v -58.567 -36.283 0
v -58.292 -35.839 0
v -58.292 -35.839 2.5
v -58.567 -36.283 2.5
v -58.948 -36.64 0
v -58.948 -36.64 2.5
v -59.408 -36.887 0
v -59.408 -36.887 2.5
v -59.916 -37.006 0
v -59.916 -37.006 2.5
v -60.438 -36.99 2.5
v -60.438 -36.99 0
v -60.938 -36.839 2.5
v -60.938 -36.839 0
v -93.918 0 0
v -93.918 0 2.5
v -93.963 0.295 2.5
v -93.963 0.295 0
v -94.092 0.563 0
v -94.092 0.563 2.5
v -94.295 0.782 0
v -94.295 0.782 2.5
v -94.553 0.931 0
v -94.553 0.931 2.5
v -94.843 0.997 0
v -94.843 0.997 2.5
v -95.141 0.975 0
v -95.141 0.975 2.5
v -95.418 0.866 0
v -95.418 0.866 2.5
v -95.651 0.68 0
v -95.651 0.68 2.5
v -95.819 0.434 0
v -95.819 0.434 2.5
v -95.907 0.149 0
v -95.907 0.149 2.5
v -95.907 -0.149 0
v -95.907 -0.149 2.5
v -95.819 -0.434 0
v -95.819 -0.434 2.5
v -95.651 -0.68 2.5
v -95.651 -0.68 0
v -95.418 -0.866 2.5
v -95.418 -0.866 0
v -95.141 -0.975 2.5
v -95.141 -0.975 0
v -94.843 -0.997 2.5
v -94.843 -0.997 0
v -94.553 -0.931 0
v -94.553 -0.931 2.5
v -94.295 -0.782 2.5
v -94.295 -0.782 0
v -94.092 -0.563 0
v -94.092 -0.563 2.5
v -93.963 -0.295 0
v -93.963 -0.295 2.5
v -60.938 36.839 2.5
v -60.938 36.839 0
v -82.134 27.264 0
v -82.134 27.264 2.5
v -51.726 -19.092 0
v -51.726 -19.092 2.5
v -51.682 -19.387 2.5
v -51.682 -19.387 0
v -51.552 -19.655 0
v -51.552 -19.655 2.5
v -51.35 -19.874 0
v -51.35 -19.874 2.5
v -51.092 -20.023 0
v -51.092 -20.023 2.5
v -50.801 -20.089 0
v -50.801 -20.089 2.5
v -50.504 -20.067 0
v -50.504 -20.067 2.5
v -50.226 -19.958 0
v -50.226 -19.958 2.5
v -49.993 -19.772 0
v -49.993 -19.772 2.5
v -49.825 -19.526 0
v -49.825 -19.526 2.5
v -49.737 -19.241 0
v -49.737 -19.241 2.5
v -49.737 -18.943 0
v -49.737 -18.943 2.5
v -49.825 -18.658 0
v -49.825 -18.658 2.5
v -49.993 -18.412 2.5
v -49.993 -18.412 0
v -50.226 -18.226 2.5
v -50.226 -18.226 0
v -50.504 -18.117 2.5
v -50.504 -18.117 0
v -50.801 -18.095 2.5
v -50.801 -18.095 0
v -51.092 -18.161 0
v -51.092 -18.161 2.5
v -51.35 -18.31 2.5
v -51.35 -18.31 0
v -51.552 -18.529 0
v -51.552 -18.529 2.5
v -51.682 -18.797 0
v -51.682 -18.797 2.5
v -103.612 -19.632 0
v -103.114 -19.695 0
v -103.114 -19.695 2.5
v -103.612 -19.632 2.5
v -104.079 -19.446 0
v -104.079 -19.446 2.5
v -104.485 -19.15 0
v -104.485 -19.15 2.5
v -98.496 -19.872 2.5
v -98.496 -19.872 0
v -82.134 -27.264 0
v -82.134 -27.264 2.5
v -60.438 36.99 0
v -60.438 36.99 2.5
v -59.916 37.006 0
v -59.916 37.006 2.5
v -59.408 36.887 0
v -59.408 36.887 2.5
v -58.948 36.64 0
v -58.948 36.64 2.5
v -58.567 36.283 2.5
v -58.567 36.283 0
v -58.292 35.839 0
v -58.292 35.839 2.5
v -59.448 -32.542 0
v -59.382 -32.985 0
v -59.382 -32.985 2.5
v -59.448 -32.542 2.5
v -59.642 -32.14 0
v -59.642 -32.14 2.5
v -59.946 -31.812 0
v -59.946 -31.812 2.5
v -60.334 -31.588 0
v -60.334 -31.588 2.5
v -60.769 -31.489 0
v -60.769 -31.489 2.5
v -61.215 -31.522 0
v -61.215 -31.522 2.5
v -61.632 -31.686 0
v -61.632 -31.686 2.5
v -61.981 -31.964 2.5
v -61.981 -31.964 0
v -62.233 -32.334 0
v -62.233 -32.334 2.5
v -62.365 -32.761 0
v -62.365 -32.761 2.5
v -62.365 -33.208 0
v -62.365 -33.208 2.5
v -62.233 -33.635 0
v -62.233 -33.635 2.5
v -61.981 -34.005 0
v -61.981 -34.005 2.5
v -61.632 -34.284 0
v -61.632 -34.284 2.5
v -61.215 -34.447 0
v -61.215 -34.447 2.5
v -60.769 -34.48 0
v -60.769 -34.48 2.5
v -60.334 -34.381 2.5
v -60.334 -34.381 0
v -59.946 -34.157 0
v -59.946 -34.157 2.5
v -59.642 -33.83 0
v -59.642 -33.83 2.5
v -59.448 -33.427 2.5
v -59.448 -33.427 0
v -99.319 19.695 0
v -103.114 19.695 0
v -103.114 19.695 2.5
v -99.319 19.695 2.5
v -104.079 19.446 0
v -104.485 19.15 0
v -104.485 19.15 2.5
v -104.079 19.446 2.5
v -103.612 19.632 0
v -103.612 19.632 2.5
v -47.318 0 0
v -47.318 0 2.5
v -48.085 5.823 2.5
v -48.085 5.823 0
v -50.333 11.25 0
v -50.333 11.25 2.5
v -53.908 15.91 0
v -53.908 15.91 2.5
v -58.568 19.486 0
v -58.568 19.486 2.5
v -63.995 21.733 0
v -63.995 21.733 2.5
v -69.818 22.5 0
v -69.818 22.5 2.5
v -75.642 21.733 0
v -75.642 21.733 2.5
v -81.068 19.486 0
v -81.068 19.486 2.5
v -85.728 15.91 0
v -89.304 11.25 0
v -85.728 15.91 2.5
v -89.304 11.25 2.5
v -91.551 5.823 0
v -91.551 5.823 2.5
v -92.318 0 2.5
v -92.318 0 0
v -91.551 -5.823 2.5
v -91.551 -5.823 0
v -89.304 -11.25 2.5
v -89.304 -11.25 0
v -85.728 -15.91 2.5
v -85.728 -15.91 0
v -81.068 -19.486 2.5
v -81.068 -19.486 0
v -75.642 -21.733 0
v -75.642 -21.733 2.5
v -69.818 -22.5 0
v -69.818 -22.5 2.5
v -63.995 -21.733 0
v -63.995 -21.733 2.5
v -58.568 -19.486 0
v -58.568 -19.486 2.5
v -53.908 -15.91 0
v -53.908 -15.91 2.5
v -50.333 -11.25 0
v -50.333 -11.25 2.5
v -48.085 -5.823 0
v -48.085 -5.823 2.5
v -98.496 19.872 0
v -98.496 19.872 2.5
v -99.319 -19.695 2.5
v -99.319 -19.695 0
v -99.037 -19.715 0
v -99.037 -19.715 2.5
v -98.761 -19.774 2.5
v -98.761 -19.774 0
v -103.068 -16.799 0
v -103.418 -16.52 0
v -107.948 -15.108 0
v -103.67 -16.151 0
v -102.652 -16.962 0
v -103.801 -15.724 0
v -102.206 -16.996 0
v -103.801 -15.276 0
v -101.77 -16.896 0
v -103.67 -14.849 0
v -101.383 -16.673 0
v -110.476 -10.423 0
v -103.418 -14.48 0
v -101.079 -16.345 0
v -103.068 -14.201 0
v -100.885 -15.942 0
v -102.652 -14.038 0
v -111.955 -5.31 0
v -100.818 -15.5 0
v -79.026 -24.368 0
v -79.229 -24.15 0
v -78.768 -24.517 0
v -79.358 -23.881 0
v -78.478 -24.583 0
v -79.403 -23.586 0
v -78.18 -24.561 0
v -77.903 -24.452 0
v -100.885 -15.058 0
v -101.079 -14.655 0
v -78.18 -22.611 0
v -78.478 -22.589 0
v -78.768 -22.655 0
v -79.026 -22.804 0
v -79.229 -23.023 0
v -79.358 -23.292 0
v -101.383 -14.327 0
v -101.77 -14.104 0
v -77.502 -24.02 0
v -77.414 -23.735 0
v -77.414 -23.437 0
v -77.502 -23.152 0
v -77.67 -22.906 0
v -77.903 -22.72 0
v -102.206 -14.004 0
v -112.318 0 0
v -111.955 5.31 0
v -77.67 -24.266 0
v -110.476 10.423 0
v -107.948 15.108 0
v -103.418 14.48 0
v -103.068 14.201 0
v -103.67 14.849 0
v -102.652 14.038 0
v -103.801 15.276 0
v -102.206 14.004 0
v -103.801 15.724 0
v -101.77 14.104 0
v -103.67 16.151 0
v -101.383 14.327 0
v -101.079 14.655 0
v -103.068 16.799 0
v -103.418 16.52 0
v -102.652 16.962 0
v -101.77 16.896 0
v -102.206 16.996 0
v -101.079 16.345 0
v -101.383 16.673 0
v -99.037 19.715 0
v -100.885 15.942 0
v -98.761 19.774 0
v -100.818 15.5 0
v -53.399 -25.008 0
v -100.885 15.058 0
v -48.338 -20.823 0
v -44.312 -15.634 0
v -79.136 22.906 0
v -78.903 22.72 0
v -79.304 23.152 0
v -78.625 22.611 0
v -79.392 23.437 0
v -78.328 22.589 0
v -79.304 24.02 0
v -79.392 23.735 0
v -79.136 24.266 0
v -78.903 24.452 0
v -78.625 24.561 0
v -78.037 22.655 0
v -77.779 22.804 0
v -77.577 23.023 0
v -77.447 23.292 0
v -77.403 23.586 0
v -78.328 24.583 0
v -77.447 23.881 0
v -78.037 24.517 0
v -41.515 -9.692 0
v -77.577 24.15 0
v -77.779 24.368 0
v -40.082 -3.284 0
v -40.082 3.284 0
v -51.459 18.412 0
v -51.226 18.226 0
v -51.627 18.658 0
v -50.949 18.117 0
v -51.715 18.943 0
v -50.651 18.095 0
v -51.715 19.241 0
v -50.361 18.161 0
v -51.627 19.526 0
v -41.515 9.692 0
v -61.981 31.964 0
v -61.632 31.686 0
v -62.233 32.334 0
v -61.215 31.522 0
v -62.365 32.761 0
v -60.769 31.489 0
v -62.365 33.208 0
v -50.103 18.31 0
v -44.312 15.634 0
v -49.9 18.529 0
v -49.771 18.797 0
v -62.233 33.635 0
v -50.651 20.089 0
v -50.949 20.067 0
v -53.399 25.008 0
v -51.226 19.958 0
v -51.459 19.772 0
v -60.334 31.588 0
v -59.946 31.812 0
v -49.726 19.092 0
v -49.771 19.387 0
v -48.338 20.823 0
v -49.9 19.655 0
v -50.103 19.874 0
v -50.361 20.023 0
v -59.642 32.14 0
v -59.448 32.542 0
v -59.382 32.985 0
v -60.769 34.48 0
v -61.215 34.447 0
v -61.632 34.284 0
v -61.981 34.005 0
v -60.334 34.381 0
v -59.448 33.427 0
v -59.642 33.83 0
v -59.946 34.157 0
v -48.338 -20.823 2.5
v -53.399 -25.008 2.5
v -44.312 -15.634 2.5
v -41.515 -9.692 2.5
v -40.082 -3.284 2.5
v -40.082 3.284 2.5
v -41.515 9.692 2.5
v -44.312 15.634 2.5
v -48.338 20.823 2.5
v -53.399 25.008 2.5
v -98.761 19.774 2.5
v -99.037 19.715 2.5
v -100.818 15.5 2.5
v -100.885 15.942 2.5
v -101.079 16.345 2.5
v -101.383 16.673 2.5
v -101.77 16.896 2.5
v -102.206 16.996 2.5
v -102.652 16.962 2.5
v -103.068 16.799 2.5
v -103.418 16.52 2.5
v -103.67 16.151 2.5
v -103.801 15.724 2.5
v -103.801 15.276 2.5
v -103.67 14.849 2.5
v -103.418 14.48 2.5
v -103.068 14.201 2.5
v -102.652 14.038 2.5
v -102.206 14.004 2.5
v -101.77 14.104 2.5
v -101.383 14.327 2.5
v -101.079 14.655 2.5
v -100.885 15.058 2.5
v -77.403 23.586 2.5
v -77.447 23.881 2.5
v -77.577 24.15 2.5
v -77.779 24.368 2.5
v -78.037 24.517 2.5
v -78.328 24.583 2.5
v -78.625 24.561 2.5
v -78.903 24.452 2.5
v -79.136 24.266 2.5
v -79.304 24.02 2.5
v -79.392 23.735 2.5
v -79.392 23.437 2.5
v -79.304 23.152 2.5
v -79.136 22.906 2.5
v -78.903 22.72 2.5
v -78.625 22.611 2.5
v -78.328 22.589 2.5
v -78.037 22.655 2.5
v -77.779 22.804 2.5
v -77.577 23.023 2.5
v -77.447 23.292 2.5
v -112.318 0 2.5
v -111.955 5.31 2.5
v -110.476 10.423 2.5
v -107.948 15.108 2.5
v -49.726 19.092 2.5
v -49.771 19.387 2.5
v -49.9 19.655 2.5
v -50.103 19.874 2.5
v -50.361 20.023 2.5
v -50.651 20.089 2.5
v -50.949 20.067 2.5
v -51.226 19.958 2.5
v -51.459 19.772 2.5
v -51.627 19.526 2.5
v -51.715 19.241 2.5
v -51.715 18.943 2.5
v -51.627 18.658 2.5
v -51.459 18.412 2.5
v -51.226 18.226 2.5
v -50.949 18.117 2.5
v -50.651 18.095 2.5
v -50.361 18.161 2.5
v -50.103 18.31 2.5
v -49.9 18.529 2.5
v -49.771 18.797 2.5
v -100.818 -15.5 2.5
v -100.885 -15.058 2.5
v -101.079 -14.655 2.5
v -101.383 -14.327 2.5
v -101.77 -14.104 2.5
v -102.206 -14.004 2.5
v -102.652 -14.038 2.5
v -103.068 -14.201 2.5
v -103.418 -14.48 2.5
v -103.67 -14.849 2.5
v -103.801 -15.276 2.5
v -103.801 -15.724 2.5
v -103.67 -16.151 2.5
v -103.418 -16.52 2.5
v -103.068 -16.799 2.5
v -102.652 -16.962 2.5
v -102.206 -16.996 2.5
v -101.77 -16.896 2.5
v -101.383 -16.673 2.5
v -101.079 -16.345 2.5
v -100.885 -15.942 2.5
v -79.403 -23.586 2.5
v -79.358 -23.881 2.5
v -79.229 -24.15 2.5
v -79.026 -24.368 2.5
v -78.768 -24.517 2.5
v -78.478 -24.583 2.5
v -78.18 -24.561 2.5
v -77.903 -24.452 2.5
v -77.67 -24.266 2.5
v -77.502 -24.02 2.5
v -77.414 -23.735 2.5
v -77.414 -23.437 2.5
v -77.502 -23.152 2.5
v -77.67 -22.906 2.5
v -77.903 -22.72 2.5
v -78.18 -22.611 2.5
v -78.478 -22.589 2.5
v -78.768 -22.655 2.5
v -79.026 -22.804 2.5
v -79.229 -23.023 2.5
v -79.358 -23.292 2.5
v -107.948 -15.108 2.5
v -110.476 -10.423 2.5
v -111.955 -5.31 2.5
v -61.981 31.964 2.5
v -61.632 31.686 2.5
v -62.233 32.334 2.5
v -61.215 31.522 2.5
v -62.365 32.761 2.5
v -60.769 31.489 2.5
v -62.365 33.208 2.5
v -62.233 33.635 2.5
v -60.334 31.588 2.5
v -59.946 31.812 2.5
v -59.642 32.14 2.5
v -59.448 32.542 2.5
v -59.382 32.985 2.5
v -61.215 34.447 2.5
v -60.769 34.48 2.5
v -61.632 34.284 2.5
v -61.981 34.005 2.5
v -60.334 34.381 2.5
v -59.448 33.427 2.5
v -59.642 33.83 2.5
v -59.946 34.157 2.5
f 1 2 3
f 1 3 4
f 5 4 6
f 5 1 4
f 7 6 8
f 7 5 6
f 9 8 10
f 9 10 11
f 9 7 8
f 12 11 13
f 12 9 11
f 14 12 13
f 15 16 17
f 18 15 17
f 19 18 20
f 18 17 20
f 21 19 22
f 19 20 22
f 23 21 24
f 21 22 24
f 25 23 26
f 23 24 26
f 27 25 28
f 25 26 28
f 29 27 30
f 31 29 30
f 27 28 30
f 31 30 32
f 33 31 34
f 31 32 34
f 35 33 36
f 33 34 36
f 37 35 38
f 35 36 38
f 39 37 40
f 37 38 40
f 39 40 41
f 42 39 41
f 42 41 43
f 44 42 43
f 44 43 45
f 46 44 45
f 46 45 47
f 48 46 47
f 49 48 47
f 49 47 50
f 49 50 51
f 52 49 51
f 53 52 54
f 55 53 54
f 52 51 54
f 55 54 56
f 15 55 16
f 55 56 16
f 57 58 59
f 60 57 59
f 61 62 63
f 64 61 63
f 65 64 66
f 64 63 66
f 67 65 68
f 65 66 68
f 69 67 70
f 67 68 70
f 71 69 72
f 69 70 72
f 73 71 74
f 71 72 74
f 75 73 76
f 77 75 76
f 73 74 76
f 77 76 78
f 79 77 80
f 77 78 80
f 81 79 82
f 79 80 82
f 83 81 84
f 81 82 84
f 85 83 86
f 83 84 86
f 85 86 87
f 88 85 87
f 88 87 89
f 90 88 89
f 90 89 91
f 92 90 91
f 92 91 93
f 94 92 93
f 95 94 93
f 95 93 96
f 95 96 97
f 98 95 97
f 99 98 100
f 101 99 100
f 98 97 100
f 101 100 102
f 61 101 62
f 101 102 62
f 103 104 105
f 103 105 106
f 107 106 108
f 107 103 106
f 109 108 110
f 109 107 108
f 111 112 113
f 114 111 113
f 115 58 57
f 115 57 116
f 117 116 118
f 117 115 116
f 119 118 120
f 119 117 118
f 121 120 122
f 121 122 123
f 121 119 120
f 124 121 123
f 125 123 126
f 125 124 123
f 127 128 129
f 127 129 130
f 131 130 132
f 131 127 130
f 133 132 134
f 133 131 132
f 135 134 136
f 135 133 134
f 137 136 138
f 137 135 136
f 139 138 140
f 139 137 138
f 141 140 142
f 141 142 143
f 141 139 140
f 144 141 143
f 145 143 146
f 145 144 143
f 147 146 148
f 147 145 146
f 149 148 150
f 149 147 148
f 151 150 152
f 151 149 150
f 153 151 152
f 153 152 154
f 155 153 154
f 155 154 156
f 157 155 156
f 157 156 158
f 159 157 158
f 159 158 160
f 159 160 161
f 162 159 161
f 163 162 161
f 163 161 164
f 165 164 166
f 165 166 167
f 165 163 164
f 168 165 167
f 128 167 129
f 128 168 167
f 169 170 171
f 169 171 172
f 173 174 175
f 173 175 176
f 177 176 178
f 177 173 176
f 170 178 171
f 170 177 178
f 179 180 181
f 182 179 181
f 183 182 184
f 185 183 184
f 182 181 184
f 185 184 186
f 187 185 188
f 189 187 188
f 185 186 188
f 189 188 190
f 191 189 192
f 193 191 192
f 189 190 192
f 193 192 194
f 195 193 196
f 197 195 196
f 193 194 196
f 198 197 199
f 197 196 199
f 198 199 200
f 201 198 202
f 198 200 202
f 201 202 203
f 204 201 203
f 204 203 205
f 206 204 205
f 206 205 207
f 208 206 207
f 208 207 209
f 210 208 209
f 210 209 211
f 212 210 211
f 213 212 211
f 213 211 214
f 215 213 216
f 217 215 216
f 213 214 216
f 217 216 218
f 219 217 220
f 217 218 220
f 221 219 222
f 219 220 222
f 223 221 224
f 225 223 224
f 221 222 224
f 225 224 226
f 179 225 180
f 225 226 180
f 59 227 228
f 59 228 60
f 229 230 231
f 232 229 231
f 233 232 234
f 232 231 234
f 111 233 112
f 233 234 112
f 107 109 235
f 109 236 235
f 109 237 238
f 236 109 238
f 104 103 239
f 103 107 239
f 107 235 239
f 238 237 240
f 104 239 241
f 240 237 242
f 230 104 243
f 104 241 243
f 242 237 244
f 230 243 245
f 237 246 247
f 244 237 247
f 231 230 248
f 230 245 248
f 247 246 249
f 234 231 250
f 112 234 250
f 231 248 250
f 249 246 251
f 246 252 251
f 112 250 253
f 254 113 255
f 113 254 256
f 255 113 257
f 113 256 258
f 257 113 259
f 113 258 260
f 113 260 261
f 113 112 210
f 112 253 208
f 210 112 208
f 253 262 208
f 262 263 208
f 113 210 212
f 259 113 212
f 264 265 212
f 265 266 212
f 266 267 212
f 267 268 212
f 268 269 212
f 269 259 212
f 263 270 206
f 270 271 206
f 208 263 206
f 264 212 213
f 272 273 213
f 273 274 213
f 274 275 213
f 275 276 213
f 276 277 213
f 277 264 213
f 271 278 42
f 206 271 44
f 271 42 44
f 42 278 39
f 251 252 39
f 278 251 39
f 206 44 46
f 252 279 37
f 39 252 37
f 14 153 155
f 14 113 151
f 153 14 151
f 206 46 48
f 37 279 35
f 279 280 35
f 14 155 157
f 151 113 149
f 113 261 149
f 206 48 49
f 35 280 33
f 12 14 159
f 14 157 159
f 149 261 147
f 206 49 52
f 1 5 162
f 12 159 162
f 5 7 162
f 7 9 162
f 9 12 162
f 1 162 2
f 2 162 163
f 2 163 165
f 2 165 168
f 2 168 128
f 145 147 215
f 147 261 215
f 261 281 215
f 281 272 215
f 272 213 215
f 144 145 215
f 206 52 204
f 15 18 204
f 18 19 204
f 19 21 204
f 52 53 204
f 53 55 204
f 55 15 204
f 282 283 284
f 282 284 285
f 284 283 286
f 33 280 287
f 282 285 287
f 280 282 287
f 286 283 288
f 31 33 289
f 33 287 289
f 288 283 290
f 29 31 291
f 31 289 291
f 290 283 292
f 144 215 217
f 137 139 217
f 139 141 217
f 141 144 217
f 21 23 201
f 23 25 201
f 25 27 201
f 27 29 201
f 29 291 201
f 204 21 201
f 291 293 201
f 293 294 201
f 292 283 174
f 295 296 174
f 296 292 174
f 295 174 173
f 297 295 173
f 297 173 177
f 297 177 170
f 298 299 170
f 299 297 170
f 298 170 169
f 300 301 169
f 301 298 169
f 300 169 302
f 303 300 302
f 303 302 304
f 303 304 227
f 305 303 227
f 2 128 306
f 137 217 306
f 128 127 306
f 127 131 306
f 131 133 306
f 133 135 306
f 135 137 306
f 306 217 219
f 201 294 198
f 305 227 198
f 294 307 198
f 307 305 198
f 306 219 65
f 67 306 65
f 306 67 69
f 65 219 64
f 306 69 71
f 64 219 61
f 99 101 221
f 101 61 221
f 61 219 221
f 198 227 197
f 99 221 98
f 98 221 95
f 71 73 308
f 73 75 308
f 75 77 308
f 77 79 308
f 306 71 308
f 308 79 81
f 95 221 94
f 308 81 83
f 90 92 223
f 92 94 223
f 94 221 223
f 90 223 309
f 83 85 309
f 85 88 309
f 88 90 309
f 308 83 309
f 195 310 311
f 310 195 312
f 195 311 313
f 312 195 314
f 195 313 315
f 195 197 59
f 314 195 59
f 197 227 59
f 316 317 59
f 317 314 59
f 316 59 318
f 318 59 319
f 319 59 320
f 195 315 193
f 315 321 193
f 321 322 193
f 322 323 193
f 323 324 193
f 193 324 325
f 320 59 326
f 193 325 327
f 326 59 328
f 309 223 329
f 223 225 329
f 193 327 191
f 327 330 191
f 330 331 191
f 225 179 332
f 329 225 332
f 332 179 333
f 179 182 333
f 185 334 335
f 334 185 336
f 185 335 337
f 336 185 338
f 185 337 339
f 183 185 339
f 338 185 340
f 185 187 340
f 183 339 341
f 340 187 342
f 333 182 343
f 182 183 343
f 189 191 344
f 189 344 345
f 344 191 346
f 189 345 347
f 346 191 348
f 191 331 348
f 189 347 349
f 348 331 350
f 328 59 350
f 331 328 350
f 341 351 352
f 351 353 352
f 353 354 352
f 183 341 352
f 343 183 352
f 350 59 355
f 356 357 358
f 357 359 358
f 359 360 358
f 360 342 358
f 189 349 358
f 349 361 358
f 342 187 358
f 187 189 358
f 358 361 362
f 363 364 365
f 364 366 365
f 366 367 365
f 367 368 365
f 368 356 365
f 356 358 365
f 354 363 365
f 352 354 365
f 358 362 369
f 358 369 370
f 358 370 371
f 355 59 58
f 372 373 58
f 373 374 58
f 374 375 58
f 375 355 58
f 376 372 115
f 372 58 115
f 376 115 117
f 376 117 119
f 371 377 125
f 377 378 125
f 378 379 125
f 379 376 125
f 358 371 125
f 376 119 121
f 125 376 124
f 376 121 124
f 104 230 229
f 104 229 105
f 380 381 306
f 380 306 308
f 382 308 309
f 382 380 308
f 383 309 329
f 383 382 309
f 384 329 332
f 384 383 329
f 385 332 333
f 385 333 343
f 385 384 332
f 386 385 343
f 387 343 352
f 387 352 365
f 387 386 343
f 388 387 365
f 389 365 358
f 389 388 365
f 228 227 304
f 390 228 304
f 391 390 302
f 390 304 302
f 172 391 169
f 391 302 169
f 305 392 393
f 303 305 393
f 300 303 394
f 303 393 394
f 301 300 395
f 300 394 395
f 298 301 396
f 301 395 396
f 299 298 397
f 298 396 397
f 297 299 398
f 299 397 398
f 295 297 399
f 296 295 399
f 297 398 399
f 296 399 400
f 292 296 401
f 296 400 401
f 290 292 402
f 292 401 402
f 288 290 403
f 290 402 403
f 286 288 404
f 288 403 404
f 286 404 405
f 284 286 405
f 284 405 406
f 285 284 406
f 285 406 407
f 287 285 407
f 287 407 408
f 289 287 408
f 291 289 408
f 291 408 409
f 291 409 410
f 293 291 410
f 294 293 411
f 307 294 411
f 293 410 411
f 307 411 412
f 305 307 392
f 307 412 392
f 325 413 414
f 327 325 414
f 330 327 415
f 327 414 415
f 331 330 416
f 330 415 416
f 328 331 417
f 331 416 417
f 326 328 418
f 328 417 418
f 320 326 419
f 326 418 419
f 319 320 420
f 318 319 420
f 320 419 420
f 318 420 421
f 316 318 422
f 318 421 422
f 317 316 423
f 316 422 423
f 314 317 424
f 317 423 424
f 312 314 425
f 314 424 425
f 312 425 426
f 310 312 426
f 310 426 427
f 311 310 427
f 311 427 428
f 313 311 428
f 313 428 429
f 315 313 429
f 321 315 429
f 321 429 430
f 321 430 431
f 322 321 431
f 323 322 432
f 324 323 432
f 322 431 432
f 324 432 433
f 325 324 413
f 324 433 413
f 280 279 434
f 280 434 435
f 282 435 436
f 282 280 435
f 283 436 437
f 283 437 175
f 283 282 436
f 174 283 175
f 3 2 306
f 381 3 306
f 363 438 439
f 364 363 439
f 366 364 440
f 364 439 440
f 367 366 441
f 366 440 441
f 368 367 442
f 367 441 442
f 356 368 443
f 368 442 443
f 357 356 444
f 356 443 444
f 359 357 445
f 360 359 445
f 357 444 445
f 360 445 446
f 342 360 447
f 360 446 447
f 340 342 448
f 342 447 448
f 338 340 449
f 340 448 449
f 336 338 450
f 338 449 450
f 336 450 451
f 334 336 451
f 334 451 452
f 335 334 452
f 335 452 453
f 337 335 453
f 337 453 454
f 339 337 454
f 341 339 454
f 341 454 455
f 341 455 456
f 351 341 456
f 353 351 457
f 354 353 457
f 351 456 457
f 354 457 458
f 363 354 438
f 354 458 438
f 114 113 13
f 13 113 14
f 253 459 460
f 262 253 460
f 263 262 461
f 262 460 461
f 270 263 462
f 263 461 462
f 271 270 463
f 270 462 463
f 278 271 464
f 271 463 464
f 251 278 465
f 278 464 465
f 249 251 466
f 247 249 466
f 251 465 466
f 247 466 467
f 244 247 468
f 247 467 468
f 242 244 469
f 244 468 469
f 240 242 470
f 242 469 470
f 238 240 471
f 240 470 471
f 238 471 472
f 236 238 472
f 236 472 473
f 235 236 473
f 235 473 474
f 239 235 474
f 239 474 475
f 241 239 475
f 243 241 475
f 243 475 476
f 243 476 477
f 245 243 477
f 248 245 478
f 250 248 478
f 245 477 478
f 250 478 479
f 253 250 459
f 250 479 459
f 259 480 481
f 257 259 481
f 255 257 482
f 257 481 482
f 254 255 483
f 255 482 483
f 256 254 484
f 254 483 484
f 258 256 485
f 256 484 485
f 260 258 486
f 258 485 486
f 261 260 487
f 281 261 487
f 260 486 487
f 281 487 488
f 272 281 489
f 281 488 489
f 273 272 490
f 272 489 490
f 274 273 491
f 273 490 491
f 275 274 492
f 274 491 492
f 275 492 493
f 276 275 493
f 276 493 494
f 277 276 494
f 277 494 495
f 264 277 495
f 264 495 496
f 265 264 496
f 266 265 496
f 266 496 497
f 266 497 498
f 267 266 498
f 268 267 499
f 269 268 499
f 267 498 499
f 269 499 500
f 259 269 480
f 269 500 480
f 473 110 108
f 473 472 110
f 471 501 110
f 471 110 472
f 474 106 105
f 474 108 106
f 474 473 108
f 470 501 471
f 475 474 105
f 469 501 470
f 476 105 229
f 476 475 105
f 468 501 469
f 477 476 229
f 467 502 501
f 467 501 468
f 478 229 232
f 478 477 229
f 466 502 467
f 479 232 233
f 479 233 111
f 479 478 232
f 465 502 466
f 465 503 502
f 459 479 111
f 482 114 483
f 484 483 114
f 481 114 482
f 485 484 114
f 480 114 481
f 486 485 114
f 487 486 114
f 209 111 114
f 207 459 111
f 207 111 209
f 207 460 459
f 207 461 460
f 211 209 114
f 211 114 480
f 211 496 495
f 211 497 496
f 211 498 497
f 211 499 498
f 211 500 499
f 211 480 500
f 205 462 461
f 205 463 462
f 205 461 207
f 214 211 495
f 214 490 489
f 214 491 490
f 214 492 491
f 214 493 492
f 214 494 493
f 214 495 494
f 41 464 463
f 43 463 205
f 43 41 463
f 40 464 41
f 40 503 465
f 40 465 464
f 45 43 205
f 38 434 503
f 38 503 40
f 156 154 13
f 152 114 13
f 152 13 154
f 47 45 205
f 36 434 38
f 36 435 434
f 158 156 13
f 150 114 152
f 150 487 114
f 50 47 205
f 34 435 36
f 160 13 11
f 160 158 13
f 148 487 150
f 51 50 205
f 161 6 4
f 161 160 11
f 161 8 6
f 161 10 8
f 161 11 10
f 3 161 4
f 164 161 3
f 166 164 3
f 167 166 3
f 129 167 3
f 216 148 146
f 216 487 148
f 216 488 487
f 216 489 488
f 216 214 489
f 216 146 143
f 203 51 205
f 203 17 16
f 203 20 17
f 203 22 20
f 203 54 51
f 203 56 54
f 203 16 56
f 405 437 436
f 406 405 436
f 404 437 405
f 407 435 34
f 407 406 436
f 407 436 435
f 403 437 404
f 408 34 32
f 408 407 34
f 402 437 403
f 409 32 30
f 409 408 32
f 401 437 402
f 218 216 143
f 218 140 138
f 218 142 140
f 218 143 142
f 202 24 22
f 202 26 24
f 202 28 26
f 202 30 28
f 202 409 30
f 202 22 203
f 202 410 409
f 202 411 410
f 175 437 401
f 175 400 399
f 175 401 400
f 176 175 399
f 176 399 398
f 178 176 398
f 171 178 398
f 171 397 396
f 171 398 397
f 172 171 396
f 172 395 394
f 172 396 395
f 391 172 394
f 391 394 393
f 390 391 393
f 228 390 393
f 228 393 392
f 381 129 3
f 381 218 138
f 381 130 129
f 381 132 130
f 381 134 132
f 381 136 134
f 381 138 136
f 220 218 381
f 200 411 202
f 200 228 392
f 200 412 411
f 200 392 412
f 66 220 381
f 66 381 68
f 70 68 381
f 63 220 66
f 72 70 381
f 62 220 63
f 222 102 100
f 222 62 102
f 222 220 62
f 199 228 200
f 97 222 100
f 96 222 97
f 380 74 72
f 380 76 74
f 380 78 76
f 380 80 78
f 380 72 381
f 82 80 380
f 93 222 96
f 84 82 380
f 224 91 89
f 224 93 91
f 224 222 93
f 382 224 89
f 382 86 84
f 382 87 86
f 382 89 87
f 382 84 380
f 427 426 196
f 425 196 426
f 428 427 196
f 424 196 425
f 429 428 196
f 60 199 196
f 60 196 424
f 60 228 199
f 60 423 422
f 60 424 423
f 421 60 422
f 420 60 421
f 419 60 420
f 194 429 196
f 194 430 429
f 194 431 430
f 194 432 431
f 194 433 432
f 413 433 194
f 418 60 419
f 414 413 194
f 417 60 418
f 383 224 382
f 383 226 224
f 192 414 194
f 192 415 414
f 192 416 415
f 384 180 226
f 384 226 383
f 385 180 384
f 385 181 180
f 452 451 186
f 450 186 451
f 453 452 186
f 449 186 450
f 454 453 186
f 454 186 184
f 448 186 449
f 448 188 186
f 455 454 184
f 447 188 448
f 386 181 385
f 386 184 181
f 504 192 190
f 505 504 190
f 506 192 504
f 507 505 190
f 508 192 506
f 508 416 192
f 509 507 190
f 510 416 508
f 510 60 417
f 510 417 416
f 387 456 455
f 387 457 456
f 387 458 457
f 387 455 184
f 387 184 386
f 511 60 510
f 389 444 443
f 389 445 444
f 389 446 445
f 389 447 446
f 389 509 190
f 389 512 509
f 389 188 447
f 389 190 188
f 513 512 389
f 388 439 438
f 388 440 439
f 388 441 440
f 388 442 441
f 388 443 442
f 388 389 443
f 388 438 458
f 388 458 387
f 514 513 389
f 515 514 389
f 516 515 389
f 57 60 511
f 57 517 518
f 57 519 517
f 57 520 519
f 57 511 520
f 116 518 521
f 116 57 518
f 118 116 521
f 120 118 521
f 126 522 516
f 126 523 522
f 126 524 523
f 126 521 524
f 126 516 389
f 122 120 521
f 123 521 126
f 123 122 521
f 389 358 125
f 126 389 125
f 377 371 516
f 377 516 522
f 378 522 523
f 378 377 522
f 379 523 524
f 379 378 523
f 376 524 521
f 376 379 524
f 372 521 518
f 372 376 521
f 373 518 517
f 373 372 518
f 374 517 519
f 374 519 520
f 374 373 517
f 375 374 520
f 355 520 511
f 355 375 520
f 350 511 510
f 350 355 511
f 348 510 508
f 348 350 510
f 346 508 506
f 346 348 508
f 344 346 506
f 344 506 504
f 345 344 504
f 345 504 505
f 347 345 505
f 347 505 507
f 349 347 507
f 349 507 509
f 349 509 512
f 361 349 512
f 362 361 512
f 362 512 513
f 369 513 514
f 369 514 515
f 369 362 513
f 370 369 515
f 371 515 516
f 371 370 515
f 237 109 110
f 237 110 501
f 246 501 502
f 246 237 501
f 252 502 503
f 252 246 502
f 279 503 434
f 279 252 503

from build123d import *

# Parameters (mm, degrees)
CROQUIS1_R              = 2.25
CROQUIS1_R_2            = 3
CROQUIS1_R_3            = 1.5
CROQUIS1_R_4            = 2.249997567
SALIENTE_EXTRUIR1_DEPTH = 2.5
SALIENTE_EXTRUIR3_START = -2.5
CROQUIS6_R              = 2.250000066
CROQUIS6_R_2            = 1.5
CROQUIS6_R_3            = 2.25
SALIENTE_EXTRUIR3_DEPTH = 2.5
CROQUIS5_R              = 22.5
CROQUIS5_R_2            = 1
CORTAR_EXTRUIR5_DEPTH   = 2.5
CORTAR_EXTRUIR6_DEPTH   = 2.5
SALIENTE_EXTRUIR4_START = -2.5
CROQUIS11_R             = 1.5
CROQUIS11_R_2           = 1.500000006
SALIENTE_EXTRUIR4_DEPTH = 2.5
REDONDEO1_START         = -1
REDONDEO1_DEPTH         = 4
REDONDEO1_2_DEPTH       = 2.5
CROQUIS12_R             = 1.5
CORTAR_EXTRUIR7_DEPTH   = 2.5


with BuildPart() as part:
    # Croquis1 → Saliente-Extruir1 (new body)
    with BuildSketch(Plane.XY):
        with BuildLine():
            Line((-29.502526327, -44.949972179), (-23.17778065, -37.243838032))
            ThreePointArc((-23.17778065, -37.243838032), (-18.839723212, -32.444384768), (-14.046056443, -28.099933953))
            ThreePointArc((-14.046056443, -28.099933953), (-12.991422185, -27.658257217), (-11.867164621, -27.866527921))
            ThreePointArc((-11.867164621, -27.866527921), (-11.203313373, -28.112469078), (-10.500314, -28.196))
            Line((-10.500314, -28.196), (10.499686, -28.196))
            ThreePointArc((10.499686, -28.196), (11.203007921, -28.112542722), (11.867164264, -27.866528101))
            ThreePointArc((11.867164264, -27.866528101), (12.991422421, -27.658256674), (14.046057406, -28.099933523))
            ThreePointArc((14.046057406, -28.099933523), (18.839775902, -32.444337151), (23.177889012, -37.243749049))
            Line((23.177889012, -37.243749049), (29.502526012, -44.949972049))
            ThreePointArc((29.502526012, -44.949972049), (40.113877497, -46.255199126), (41.931739547, -35.719556022))
            Line((41.931739547, -35.719556022), (21.72923101, -5.566101046))
            ThreePointArc((21.72923101, -5.566101046), (20.036969431, -9.5e-08), (21.729230693, 5.566100954))
            Line((21.729230693, 5.566100954), (41.931739693, 35.719555954))
            ThreePointArc((41.931739693, 35.719555954), (40.113877277, 46.255198335), (29.502526336, 44.949972165))
            Line((29.502526336, 44.949972165), (23.17778065, 37.243838007))
            ThreePointArc((23.17778065, 37.243838007), (18.839723212, 32.444384742), (14.046056443, 28.099933927))
            ThreePointArc((14.046056443, 28.099933927), (12.991421988, 27.658257139), (11.867164252, 27.866528027))
            ThreePointArc((11.867164252, 27.866528027), (11.203313175, 28.112469073), (10.500314, 28.195999974))
            Line((10.500314, 28.195999974), (-10.500314, 28.195999974))
            ThreePointArc((-10.500314, 28.195999974), (-11.203313178, 28.112469098), (-11.867164264, 27.866528075))
            ThreePointArc((-11.867164264, 27.866528075), (-12.991422421, 27.658256648), (-14.046057406, 28.099933497))
            ThreePointArc((-14.046057406, 28.099933497), (-18.839775902, 32.444337126), (-23.177889012, 37.243749023))
            Line((-23.177889012, 37.243749023), (-29.502526012, 44.949972023))
            ThreePointArc((-29.502526012, 44.949972023), (-40.146302424, 46.230987494), (-41.886340556, 35.652554517))
            ThreePointArc((-41.886340556, 35.652554517), (-41.288874902, 25.337679941), (-50.13550001, 20.000000021))
            Line((-50.13550001, 20.000000021), (-97.31807601, 20.000000021))
            ThreePointArc((-97.31807601, 20.000000021), (-99.1994919, 19.554558541), (-100.681450855, 18.312809163))
            add(Edge.make_bspline(
                [(-107.31807554, 2.1e-08), (-107.252414123, 7.059743944), (-104.975710329, 13.164639039), (-100.681450855, 18.312809163)],
                knots=[0, 0, 0, 0, 1, 1, 1, 1], degree=3))
            add(Edge.make_bspline(
                [(-107.31807554, 2.1e-08), (-107.252414123, -7.059743902), (-104.975710329, -13.164638997), (-100.681450855, -18.312809121)],
                knots=[0, 0, 0, 0, 1, 1, 1, 1], degree=3))
            ThreePointArc((-100.681450855, -18.312809121), (-99.19949186, -19.554558345), (-97.31807601, -19.9999997))
            Line((-97.31807601, -19.9999997), (-50.13550001, -19.9999997))
            ThreePointArc((-50.13550001, -19.9999997), (-41.288874902, -25.33767962), (-41.886340556, -35.652554196))
            ThreePointArc((-41.886340556, -35.652554196), (-40.146302646, -46.230987042), (-29.502526327, -44.949972179))
        make_face()
        with Locations((-25.371621, 27.641642)):
            Circle(CROQUIS1_R, mode=Mode.SUBTRACT)
        with Locations((-35.493242035, 40.033284004)):
            Circle(CROQUIS1_R, mode=Mode.SUBTRACT)
        with Locations((-35.49324201, -40.0332837)):
            Circle(CROQUIS1_R, mode=Mode.SUBTRACT)
        with Locations((15.25, -15.25)):
            Circle(CROQUIS1_R_2, mode=Mode.SUBTRACT)
        with Locations((35.493242035, -40.03328403)):
            Circle(CROQUIS1_R, mode=Mode.SUBTRACT)
        with Locations((-15.25, 15.25)):
            Circle(CROQUIS1_R_2, mode=Mode.SUBTRACT)
        with Locations((-25.371621, -27.641642)):
            Circle(CROQUIS1_R, mode=Mode.SUBTRACT)
        with Locations((-35.318076, 15.5)):
            Circle(CROQUIS1_R_3, mode=Mode.SUBTRACT)
        with Locations((25.371621, -27.641642)):
            Circle(CROQUIS1_R, mode=Mode.SUBTRACT)
        with Locations((-15.25, -15.25)):
            Circle(CROQUIS1_R_2, mode=Mode.SUBTRACT)
        with Locations((-97.318076, 15.5)):
            Circle(CROQUIS1_R_3, mode=Mode.SUBTRACT)
        with Locations((15.25, 15.25)):
            Circle(CROQUIS1_R_2, mode=Mode.SUBTRACT)
        with Locations((-35.318076, -15.5)):
            Circle(CROQUIS1_R_3, mode=Mode.SUBTRACT)
        with Locations((25.371621, 27.641642)):
            Circle(CROQUIS1_R, mode=Mode.SUBTRACT)
        with Locations((-97.318076, -15.5)):
            Circle(CROQUIS1_R_3, mode=Mode.SUBTRACT)
        with Locations((35.493241695, 40.03328329)):
            Circle(CROQUIS1_R_4, mode=Mode.SUBTRACT)
        with BuildLine():
            Line((10.499686, -24.196), (-10.500314, -24.196))
            ThreePointArc((-10.500314, -24.196), (-11.500314, -25.196), (-10.500314, -26.196))
            Line((-10.500314, -26.196), (10.499686, -26.196))
            ThreePointArc((10.499686, -26.196), (11.499686, -25.196), (10.499686, -24.196))
        make_face(mode=Mode.SUBTRACT)
        with BuildLine():
            Line((10.499686, 24.196), (-10.500314, 24.196))
            ThreePointArc((-10.500314, 24.196), (-11.500314, 25.196), (-10.500314, 26.196))
            Line((-10.500314, 26.196), (10.499686, 26.196))
            ThreePointArc((10.499686, 26.196), (11.499686, 25.196), (10.499686, 24.196))
        make_face(mode=Mode.SUBTRACT)
    extrude(amount=SALIENTE_EXTRUIR1_DEPTH)


with BuildPart() as saliente_extruir3_tool:
    # Croquis6 → Saliente-Extruir3 (new body)
    # profile 1 of 10: a face of its own
    with BuildSketch(Plane.XY.offset(2.5).offset(SALIENTE_EXTRUIR3_START)):
        with Locations((-35.493242163, 40.033284025)):
            Circle(CROQUIS6_R)
        with Locations((-35.493242163, 40.033284025)):
            Circle(CROQUIS6_R_2, mode=Mode.SUBTRACT)
    # profile 2 of 10: a face of its own
    with BuildSketch(Plane.XY.offset(2.5).offset(SALIENTE_EXTRUIR3_START)):
        with Locations((-25.371621, 27.641642)):
            Circle(CROQUIS6_R_3)
        with Locations((-25.371621, 27.641642)):
            Circle(CROQUIS6_R_2, mode=Mode.SUBTRACT)
    # profile 3 of 10: a face of its own
    with BuildSketch(Plane.XY.offset(2.5).offset(SALIENTE_EXTRUIR3_START)):
        with Locations((25.371621, 27.641642)):
            Circle(CROQUIS6_R_3)
        with Locations(Location((25.371621, 27.641642, 0), (0, 0, 180))):
            Circle(CROQUIS6_R_2, mode=Mode.SUBTRACT)
    # profile 4 of 10: a face of its own
    with BuildSketch(Plane.XY.offset(2.5).offset(SALIENTE_EXTRUIR3_START)):
        with Locations((35.493242163, 40.033284025)):
            Circle(CROQUIS6_R)
        with Locations(Location((35.493242163, 40.033284025, 0), (0, 0, 180))):
            Circle(CROQUIS6_R_2, mode=Mode.SUBTRACT)
    # profile 5 of 10: a face of its own
    with BuildSketch(Plane.XY.offset(2.5).offset(SALIENTE_EXTRUIR3_START)):
        with Locations((35.493242163, -40.033284025)):
            Circle(CROQUIS6_R)
        with Locations((35.493242163, -40.033284025)):
            Circle(CROQUIS6_R_2, mode=Mode.SUBTRACT)
    # profile 6 of 10: a face of its own
    with BuildSketch(Plane.XY.offset(2.5).offset(SALIENTE_EXTRUIR3_START)):
        with Locations((25.371621, -27.641642)):
            Circle(CROQUIS6_R_3)
        with Locations((25.371621, -27.641642)):
            Circle(CROQUIS6_R_2, mode=Mode.SUBTRACT)
    # profile 7 of 10: a face of its own
    with BuildSketch(Plane.XY.offset(2.5).offset(SALIENTE_EXTRUIR3_START)):
        with Locations((-25.371621, -27.641642)):
            Circle(CROQUIS6_R_3)
        with Locations(Location((-25.371621, -27.641642, 0), (0, 0, 180))):
            Circle(CROQUIS6_R_2, mode=Mode.SUBTRACT)
    # profile 8 of 10: a face of its own
    with BuildSketch(Plane.XY.offset(2.5).offset(SALIENTE_EXTRUIR3_START)):
        with Locations((-35.493242163, -40.033284025)):
            Circle(CROQUIS6_R)
        with Locations(Location((-35.493242163, -40.033284025, 0), (0, 0, 180))):
            Circle(CROQUIS6_R_2, mode=Mode.SUBTRACT)
    # profile 9 of 10: a face of its own
    with BuildSketch(Plane.XY.offset(2.5).offset(SALIENTE_EXTRUIR3_START)):
        with BuildLine():
            Line((-99.1994919, 19.554558541), (-40.146302424, 46.230987494))
            ThreePointArc((-40.146302424, 46.230987494), (-43.140478024, 41.291171845), (-41.886340556, 35.652554517))
            ThreePointArc((-41.886340556, 35.652554517), (-41.288875033, 25.33768001), (-50.13550001, 20.000000021))
            Line((-50.13550001, 20.000000021), (-97.31807601, 20.000000021))
            ThreePointArc((-97.31807601, 20.000000021), (-98.214581153, 19.590579436), (-99.1994919, 19.554558541))
        make_face()
    # profile 10 of 10: a face of its own
    with BuildSketch(Plane.XY.offset(2.5).offset(SALIENTE_EXTRUIR3_START)):
        with BuildLine():
            Line((-50.13550001, -20.000000021), (-97.31807601, -20.000000021))
            ThreePointArc((-97.31807601, -20.000000021), (-98.214581153, -19.590579436), (-99.1994919, -19.554558541))
            Line((-99.1994919, -19.554558541), (-40.146302424, -46.230987494))
            ThreePointArc((-40.146302424, -46.230987494), (-43.140478024, -41.291171845), (-41.886340556, -35.652554517))
            ThreePointArc((-41.886340556, -35.652554517), (-41.288875033, -25.33768001), (-50.13550001, -20.000000021))
        make_face()
    extrude(amount=SALIENTE_EXTRUIR3_DEPTH)


with BuildPart() as part_1:
    add(part.part)


with BuildPart() as part_2:
    # Saliente-Extruir3: joined with saliente_extruir3_tool
    add(part_1.part.fuse(saliente_extruir3_tool.part, tol=0.00001))

    # Croquis5 → Cortar-Extruir5 (cut)
    with BuildSketch(Plane.XY.offset(2.5)):
        with Locations((-69.81807554, 2.1e-08)):
            Circle(CROQUIS5_R)
        with Locations((-78.402781137, 23.586284803)):
            Circle(CROQUIS5_R_2)
        with Locations((-94.91807554, 2.1e-08)):
            Circle(CROQUIS5_R_2)
        with Locations(Location((-78.402781137, -23.586284761, 0), (0, 0, 180))):
            Circle(CROQUIS5_R_2)
        with Locations((-50.726192448, 19.091883113)):
            Circle(CROQUIS5_R_2)
        with Locations(Location((-50.726192448, -19.091883071, 0), (0, 0, 180))):
            Circle(CROQUIS5_R_2)
    extrude(amount=-CORTAR_EXTRUIR5_DEPTH, mode=Mode.SUBTRACT)

    # Croquis10 → Cortar-Extruir6 (cut)
    with BuildSketch(Plane.XY.offset(2.5)):
        with BuildLine():
            ThreePointArc((-82.134030611, -27.263635217), (-39.901716207, 2.1e-08), (-82.134030596, 27.263635224))
            ThreePointArc((-82.134030596, 27.263635224), (79.537301339, -4.3e-08), (-82.134030611, -27.263635217))
        make_face()
    extrude(amount=-CORTAR_EXTRUIR6_DEPTH, mode=Mode.SUBTRACT)

    # Croquis11 → Saliente-Extruir4 (add)
    # profile 1 of 5: a face of its own
    with BuildSketch(Plane.XY.offset(2.5).offset(SALIENTE_EXTRUIR4_START)):
        with Locations((-97.318076, 15.5)):
            Circle(CROQUIS11_R)
    # profile 2 of 5: a face of its own
    with BuildSketch(Plane.XY.offset(2.5).offset(SALIENTE_EXTRUIR4_START)):
        with Locations((-97.318076, -15.5)):
            Circle(CROQUIS11_R)
    # profile 3 of 5: a face of its own
    with BuildSketch(Plane.XY.offset(2.5).offset(SALIENTE_EXTRUIR4_START)):
        with BuildLine():
            Line((-82.134030604, -27.263635221), (-59.115036511, -37.6621347))
            Line((-59.115036511, -37.6621347), (-53.398623675, -25.007801874))
            ThreePointArc((-53.398623675, -25.007801874), (-67.476736709, -29.824598689), (-82.134030604, -27.263635221))
        make_face()
        with Locations((-60.881562628, -32.984594162)):
            Circle(CROQUIS11_R_2, mode=Mode.SUBTRACT)
    # profile 4 of 5: a face of its own
    with BuildSketch(Plane.XY.offset(2.5).offset(SALIENTE_EXTRUIR4_START)):
        with BuildLine():
            Line((-53.398623675, 25.007801874), (-59.115036511, 37.6621347))
            Line((-59.115036511, 37.6621347), (-82.134030604, 27.263635221))
            ThreePointArc((-82.134030604, 27.263635221), (-67.476736709, 29.824598692), (-53.398623675, 25.007801874))
        make_face()
        with Locations((-60.881562628, 32.984594162)):
            Circle(CROQUIS11_R, mode=Mode.SUBTRACT)
    # profile 5 of 5: a face of its own
    with BuildSketch(Plane.XY.offset(2.5).offset(SALIENTE_EXTRUIR4_START)):
        with BuildLine():
            Line((-98.888624327, -19.694988496), (-103.888624327, -19.694988496))
            ThreePointArc((-103.888624327, -19.694988496), (-110.319866599, -10.796162946), (-112.31807554, 0))
            ThreePointArc((-112.31807554, 0), (-110.319866599, 10.796162946), (-103.888624327, 19.694988496))
            Line((-103.888624327, 19.694988496), (-98.888624327, 19.694988496))
            Line((-98.888624327, 19.694988496), (-99.19948756, 19.554560502))
            ThreePointArc((-99.19948756, 19.554560502), (-100.01296612, 19.020205966), (-100.681450855, 18.312809121))
            add(Edge.make_bspline(
                [(-107.31807554, -9.16e-07), (-107.252414182, 7.059743008), (-104.975710439, 13.164638122), (-100.681450855, 18.312809121)],
                knots=[0, 0, 0, 0, 1, 1, 1, 1], degree=3))
            add(Edge.make_bspline(
                [(-107.31807554, -9.16e-07), (-107.252414123, -7.059743902), (-104.975710329, -13.164638997), (-100.681450855, -18.312809121)],
                knots=[0, 0, 0, 0, 1, 1, 1, 1], degree=3))
            ThreePointArc((-100.681450855, -18.312809121), (-100.01296612, -19.020205966), (-99.19948756, -19.554560502))
            Line((-99.19948756, -19.554560502), (-98.888624327, -19.694988496))
        make_face()
    extrude(amount=SALIENTE_EXTRUIR4_DEPTH)

    # Redondeo1: read off the stored shape, not the designer's step
    # Redondeo1 outline → Redondeo1 (cut)
    with BuildSketch(Plane.XY.offset(REDONDEO1_START)):
        with BuildLine():
            ThreePointArc((-58.291677299, -35.839477414), (-59.407724144, -36.887134414), (-60.937693806, -36.838775491))
            Line((-60.937693806, -36.838775491), (-59.115036514, -37.662134706))
            Line((-59.115036514, -37.662134706), (-58.291677299, -35.839477414))
        make_face()
        with BuildLine():
            ThreePointArc((-103.11356154, -19.694988496), (-103.851613757, -19.553826554), (-104.48548109, -19.150267421))
            ThreePointArc((-104.48548109, -19.150267421), (-104.189253686, -19.425039593), (-103.888624327, -19.694988496))
            Line((-103.888624327, -19.694988496), (-103.11356154, -19.694988496))
        make_face()
        with BuildLine():
            Line((-59.115036514, 37.662134706), (-60.937693806, 36.838775491))
            ThreePointArc((-60.937693806, 36.838775491), (-59.407724144, 36.887134414), (-58.291677299, 35.839477414))
            Line((-58.291677299, 35.839477414), (-59.115036514, 37.662134706))
        make_face()
        with BuildLine():
            ThreePointArc((-104.48548109, 19.150267421), (-103.851613757, 19.553826554), (-103.11356154, 19.694988496))
            Line((-103.11356154, 19.694988496), (-103.888624327, 19.694988496))
            ThreePointArc((-103.888624327, 19.694988496), (-104.189253686, 19.425039593), (-104.48548109, 19.150267421))
        make_face()
    extrude(amount=REDONDEO1_DEPTH, mode=Mode.SUBTRACT)

    # Redondeo1 2 outline → Redondeo1 2 (add)
    with BuildSketch(Plane.XY):
        with BuildLine():
            Line((-98.888624327, -19.694988496), (-99.319402789, -19.694988496))
            ThreePointArc((-99.319402789, -19.694988496), (-98.898282013, -19.739826792), (-98.496043574, -19.872331205))
            Line((-98.496043574, -19.872331205), (-98.888624327, -19.694988496))
        make_face()
        with BuildLine():
            ThreePointArc((-98.496043574, 19.872331205), (-98.898282013, 19.739826792), (-99.319402789, 19.694988496))
            Line((-99.319402789, 19.694988496), (-98.888619399, 19.694988496))
            Line((-98.888619399, 19.694988496), (-98.496043574, 19.872331205))
        make_face()
    extrude(amount=REDONDEO1_2_DEPTH)

    # Croquis12 → Cortar-Extruir7 (cut)
    with BuildSketch(Plane.XY.offset(2.5)):
        with Locations((-102.318076, -15.5)):
            Circle(CROQUIS12_R)
        with Locations((-102.318076, 15.5)):
            Circle(CROQUIS12_R)
    extrude(amount=-CORTAR_EXTRUIR7_DEPTH, mode=Mode.SUBTRACT)


solid = part_2.part
